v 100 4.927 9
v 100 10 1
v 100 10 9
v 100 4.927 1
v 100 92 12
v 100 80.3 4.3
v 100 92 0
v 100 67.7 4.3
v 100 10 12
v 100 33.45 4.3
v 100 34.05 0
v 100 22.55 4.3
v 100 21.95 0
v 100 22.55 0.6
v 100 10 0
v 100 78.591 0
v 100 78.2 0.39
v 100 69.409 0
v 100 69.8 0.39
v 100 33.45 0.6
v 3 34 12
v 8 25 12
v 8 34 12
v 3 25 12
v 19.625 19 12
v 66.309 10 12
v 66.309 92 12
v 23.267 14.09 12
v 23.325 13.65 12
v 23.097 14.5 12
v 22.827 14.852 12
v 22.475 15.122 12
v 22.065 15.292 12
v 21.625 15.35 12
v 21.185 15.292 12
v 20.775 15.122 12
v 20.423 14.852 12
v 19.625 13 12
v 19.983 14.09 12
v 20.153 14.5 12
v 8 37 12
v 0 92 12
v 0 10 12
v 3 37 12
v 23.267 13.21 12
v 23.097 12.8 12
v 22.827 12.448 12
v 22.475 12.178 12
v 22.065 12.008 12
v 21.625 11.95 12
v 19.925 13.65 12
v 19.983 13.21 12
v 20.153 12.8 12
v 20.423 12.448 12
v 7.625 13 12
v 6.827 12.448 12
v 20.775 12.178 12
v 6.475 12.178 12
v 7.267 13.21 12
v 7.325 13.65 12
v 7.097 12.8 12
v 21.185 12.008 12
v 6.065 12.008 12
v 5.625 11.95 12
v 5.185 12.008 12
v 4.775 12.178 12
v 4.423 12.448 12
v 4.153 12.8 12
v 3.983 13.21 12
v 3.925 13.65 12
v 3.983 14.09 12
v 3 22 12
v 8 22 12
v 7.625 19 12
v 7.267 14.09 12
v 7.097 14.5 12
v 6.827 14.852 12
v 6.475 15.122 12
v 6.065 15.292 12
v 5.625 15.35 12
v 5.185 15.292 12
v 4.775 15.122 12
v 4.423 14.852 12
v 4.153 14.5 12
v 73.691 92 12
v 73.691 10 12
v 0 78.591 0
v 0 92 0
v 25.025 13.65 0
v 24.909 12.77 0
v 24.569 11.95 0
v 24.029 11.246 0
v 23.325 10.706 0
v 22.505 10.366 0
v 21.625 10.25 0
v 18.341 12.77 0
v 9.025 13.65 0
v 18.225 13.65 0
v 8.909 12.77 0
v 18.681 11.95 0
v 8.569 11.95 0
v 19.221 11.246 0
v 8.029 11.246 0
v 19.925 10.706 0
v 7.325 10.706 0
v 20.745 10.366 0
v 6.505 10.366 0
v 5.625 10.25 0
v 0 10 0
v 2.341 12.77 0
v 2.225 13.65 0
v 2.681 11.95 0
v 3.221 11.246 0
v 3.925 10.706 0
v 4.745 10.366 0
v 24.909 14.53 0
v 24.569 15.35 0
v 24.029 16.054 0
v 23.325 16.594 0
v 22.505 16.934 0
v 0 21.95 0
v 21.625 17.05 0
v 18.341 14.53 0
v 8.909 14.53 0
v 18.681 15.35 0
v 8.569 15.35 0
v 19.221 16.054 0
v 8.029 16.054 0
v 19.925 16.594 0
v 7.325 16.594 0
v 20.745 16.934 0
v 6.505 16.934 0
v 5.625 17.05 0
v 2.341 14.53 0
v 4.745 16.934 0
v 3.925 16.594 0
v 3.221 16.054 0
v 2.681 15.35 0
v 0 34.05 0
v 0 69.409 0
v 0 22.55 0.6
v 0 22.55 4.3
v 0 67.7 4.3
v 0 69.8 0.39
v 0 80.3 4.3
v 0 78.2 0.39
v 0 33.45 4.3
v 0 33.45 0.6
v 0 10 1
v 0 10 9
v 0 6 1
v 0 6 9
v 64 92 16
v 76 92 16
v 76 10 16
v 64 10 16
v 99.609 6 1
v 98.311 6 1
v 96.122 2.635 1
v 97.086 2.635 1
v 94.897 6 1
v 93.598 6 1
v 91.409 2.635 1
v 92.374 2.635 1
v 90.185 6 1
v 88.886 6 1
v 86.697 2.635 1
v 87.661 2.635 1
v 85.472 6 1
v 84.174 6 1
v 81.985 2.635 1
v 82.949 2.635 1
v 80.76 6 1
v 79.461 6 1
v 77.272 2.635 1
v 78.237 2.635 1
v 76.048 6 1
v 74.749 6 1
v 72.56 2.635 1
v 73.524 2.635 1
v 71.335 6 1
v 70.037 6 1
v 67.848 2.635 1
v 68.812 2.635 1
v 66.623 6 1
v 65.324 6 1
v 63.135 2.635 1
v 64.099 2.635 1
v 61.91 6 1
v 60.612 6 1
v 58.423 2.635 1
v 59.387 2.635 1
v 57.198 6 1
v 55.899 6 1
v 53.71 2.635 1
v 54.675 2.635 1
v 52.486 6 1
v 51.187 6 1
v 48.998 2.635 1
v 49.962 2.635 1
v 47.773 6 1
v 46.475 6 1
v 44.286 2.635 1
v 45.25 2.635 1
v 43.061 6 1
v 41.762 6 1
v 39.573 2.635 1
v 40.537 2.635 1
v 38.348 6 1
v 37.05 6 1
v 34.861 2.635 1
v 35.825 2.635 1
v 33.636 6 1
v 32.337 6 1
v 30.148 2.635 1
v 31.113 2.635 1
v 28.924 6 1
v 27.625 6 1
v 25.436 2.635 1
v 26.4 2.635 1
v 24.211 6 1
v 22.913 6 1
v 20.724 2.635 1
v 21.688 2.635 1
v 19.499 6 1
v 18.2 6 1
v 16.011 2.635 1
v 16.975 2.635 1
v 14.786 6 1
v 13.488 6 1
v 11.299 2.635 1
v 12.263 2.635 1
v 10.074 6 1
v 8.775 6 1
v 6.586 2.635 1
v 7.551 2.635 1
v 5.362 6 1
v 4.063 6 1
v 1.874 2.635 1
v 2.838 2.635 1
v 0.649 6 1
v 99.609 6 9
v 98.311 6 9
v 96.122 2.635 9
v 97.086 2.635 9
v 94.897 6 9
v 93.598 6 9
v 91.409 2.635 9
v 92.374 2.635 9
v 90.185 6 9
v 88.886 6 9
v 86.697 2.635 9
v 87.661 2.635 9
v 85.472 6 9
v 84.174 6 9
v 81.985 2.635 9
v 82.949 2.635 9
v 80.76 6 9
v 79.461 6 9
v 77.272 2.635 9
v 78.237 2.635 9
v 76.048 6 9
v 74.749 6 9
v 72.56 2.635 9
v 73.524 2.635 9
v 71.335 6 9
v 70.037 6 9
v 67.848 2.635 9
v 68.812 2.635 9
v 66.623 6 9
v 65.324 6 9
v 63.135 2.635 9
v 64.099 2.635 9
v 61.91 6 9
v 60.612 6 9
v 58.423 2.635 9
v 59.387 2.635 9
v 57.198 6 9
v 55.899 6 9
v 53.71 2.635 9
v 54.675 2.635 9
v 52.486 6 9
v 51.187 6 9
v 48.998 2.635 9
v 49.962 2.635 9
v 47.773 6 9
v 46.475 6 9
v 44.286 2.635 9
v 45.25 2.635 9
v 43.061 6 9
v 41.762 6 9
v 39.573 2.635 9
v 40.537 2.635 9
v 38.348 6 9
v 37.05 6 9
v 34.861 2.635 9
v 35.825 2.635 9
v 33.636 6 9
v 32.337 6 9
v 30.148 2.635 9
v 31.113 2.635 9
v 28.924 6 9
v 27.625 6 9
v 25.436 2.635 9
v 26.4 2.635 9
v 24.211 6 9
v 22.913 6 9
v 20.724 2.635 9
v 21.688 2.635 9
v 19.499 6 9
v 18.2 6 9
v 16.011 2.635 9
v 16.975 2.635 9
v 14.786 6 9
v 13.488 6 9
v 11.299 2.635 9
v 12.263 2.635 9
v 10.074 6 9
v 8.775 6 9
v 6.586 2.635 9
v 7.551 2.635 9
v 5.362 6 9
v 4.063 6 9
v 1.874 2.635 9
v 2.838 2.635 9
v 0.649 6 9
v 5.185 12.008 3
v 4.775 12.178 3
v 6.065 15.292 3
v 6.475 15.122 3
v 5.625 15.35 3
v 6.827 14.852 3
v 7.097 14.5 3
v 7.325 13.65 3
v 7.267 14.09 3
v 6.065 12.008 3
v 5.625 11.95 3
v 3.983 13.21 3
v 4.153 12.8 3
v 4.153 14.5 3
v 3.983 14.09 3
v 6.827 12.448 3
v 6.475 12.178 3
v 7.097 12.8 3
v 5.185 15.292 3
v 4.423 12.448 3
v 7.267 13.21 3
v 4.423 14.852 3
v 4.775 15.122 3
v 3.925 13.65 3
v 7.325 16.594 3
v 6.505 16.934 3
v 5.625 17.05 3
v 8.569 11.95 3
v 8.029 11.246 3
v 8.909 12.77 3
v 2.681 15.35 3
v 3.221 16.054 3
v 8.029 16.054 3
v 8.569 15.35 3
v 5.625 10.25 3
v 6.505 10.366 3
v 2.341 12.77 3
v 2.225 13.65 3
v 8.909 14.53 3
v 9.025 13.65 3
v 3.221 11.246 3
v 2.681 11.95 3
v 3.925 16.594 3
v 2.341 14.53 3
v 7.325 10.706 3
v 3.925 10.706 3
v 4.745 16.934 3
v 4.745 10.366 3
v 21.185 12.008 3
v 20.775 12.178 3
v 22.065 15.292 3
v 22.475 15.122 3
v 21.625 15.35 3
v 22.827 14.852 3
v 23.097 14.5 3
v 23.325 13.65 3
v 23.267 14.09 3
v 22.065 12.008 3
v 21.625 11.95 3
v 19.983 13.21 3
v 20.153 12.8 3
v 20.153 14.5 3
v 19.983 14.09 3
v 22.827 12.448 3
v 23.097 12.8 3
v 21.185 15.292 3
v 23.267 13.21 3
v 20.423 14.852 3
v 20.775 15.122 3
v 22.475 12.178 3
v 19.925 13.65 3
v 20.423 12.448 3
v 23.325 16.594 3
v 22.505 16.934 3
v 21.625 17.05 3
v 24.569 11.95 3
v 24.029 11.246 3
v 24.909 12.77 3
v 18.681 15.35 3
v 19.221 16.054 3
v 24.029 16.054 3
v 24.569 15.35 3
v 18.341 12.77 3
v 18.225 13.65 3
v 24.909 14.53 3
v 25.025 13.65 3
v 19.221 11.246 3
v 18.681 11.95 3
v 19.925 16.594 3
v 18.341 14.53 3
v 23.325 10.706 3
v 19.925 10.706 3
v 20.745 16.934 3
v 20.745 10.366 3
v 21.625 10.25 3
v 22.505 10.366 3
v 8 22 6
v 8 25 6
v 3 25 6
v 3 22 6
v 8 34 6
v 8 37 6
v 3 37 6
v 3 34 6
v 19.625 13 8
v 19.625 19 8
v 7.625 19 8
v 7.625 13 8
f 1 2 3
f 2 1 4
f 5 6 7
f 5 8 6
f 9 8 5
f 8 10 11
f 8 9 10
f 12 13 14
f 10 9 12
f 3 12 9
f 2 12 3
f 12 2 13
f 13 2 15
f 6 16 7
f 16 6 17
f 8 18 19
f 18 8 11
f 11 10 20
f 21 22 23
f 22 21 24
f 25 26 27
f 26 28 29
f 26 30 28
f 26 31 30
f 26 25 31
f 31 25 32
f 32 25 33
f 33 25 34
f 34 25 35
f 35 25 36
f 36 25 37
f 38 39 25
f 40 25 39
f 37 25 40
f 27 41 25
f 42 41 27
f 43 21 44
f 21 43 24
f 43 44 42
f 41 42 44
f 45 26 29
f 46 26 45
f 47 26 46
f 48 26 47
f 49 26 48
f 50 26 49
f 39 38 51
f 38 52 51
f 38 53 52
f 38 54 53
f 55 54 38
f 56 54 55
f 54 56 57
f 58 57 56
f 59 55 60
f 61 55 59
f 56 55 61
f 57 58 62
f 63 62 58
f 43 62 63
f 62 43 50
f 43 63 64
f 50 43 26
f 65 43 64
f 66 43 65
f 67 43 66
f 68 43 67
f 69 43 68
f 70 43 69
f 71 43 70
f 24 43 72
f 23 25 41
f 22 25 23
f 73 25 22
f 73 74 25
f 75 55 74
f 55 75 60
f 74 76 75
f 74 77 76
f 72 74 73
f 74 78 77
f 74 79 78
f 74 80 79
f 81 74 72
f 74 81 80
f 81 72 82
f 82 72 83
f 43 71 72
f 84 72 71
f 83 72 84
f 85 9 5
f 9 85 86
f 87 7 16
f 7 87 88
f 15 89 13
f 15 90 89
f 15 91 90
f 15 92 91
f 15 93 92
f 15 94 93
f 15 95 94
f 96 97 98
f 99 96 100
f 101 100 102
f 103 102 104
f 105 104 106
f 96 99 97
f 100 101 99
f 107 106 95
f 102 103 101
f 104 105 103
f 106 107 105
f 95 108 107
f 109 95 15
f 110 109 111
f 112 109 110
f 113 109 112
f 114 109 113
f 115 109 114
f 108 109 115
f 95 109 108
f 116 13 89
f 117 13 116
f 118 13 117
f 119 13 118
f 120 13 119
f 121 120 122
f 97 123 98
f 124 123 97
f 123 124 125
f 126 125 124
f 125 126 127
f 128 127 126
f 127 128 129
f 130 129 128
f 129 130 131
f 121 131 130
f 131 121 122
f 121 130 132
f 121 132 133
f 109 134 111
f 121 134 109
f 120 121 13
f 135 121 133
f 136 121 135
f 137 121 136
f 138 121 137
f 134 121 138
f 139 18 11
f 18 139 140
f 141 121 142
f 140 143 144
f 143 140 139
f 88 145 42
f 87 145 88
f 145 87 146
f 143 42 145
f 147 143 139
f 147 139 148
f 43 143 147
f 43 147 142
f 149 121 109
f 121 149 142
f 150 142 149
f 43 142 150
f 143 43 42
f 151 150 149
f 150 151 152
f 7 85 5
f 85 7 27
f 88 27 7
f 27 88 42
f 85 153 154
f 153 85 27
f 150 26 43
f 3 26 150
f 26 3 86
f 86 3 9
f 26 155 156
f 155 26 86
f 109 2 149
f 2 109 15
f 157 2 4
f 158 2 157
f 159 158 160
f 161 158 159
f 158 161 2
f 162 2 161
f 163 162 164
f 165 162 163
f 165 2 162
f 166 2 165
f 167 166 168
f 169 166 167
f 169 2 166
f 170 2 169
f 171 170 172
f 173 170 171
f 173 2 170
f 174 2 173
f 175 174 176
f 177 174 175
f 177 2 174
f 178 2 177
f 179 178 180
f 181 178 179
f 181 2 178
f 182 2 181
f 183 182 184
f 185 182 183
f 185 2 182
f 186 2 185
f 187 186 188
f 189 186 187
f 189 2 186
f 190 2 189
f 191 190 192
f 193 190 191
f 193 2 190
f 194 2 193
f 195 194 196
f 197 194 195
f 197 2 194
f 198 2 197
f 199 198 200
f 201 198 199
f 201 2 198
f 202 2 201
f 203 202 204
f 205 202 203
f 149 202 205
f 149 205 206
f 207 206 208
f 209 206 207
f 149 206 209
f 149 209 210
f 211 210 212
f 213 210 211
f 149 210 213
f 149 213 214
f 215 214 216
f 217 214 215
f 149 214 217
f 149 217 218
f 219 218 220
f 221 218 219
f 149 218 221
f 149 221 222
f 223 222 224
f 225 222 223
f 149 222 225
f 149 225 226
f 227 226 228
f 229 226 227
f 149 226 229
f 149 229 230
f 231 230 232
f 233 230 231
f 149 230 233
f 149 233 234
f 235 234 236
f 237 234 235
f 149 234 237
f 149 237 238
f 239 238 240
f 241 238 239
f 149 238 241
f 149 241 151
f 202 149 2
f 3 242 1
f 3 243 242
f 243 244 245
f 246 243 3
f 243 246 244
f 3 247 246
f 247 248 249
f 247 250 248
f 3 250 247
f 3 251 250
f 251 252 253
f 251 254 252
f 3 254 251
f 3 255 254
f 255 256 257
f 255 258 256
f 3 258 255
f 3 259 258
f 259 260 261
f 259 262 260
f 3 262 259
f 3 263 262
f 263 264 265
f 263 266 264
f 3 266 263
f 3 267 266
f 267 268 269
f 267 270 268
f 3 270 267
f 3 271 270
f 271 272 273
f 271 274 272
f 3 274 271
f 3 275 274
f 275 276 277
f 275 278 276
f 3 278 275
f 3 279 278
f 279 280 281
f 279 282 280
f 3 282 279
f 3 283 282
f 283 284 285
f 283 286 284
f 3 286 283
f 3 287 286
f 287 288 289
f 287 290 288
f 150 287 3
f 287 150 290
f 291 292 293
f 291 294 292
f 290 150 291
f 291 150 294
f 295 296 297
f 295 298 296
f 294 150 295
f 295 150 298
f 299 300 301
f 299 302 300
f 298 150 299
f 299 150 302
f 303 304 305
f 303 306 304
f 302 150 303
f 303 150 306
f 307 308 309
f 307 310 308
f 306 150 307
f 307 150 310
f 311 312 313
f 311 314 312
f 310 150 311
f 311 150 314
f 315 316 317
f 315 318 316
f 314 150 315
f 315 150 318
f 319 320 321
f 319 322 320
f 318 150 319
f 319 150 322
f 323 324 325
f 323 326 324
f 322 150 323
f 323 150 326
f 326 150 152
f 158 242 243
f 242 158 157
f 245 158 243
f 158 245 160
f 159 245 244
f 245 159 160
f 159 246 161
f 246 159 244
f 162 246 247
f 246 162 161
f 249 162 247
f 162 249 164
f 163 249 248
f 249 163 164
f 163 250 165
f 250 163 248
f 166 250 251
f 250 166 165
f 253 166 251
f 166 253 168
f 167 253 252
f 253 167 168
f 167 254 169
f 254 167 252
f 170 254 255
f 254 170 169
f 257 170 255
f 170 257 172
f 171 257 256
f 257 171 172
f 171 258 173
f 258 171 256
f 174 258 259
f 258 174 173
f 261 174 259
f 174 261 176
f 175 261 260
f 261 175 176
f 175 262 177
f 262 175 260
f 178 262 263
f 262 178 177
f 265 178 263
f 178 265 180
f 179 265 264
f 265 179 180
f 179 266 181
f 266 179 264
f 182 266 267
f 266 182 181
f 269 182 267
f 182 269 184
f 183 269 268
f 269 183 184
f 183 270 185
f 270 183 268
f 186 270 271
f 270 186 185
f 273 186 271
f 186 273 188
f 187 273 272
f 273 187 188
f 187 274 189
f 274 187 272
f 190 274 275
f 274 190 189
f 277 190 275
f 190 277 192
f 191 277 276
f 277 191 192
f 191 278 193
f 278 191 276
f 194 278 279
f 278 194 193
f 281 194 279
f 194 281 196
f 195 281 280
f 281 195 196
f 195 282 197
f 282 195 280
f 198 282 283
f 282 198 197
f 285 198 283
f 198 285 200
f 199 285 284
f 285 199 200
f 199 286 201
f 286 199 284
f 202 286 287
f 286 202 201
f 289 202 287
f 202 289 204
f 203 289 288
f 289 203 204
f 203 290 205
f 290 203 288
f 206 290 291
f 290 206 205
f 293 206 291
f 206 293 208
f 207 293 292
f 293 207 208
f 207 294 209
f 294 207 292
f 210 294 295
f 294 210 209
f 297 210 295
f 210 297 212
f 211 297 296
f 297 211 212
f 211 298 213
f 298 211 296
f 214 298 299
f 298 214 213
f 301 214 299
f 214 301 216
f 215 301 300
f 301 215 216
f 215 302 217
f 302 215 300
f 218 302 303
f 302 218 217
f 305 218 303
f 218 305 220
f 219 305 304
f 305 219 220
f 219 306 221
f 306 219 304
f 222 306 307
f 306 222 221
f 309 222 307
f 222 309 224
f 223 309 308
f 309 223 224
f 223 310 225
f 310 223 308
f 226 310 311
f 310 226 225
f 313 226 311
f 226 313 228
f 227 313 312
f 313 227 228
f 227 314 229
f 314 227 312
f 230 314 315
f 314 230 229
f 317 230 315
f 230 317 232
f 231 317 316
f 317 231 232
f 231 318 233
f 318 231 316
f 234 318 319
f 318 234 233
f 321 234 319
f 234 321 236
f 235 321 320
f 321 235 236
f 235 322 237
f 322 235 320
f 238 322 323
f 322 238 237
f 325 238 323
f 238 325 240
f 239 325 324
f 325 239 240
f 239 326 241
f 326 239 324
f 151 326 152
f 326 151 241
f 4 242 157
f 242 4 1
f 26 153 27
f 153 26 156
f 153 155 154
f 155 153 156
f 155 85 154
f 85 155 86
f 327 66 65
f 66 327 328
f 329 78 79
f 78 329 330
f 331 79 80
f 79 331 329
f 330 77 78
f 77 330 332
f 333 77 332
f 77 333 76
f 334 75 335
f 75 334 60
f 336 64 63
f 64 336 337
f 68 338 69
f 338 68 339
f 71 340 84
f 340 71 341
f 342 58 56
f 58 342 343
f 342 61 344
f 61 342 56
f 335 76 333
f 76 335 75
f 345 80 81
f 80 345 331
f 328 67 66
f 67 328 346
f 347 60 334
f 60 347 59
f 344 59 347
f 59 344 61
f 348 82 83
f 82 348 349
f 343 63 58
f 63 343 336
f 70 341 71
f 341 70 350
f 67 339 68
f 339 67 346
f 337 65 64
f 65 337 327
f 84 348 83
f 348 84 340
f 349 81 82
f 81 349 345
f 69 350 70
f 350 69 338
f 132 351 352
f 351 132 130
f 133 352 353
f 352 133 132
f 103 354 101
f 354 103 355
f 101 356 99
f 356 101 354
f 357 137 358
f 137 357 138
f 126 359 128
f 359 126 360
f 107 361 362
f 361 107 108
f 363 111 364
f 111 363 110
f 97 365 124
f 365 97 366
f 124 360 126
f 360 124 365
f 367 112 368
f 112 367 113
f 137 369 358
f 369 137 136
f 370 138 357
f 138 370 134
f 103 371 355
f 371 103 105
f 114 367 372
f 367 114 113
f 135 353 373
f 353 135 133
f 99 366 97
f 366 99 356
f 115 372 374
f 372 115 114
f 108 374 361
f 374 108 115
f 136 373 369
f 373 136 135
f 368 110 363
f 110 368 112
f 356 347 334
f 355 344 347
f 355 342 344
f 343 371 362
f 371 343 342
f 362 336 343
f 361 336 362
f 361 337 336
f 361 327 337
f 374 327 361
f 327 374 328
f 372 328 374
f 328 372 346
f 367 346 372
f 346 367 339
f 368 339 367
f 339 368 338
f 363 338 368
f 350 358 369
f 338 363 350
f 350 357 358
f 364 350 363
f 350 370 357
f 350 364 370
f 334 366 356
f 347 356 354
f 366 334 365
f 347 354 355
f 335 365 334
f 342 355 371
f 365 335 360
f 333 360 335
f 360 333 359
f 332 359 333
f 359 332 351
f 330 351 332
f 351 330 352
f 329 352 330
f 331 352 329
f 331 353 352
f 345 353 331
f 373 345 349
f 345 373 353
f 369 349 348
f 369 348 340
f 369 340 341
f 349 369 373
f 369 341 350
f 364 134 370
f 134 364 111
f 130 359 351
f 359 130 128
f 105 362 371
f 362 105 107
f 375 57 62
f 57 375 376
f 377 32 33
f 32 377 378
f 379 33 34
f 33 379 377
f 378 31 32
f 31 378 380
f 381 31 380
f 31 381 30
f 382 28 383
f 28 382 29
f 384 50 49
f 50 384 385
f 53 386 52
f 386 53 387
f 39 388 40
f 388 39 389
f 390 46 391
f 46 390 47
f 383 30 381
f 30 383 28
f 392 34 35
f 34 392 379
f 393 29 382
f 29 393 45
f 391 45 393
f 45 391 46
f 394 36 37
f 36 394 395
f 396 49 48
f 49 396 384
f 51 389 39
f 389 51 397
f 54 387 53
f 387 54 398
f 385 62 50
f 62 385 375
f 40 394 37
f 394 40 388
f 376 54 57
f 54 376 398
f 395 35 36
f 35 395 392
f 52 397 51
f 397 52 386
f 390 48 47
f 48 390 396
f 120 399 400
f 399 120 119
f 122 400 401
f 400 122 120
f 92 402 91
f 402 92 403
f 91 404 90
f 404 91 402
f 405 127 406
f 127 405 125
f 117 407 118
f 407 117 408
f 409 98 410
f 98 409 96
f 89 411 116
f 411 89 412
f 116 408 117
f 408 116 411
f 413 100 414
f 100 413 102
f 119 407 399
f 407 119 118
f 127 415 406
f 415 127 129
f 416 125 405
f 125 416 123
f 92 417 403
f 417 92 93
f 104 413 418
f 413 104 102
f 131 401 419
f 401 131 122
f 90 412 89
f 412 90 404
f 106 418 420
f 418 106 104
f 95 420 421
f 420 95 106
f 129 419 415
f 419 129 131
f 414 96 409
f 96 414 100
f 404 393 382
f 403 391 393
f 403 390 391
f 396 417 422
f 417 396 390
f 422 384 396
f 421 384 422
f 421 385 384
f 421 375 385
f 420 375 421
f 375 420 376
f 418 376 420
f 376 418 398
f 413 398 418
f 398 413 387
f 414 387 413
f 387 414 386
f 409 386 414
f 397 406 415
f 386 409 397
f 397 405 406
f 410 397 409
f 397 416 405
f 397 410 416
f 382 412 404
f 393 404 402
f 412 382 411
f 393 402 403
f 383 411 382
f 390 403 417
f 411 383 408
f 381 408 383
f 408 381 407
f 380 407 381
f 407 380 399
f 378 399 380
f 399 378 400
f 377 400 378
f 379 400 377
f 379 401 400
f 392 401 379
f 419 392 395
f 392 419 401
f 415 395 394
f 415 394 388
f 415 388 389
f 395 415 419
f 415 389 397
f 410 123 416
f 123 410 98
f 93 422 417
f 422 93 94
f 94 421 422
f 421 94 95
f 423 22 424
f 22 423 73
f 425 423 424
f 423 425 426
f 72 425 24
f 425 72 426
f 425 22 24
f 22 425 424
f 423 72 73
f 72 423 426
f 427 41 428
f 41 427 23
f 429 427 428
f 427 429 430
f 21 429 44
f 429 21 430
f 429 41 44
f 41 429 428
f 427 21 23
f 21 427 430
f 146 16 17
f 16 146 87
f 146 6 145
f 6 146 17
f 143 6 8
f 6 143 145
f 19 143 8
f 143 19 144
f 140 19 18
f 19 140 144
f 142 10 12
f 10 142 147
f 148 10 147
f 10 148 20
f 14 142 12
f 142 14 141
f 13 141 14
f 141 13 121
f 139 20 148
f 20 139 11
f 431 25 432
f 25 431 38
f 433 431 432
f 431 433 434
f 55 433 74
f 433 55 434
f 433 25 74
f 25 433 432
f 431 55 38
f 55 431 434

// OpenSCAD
// file: ../stage.scad
// ============================================================
//  Positioning stage: base (X dovetail) -> x-slider with column
//  (Z dovetail) -> z-slider (payload face toward +Y) + column cap.
//  Every axis: M3 adjust screw captured in the fixed part by head +
//  nylock, threading into a captive nut in the moving part
//  (0.5 mm/turn, both directions), plus an M3 lock screw.
//  Modules model parts in stage-local coordinates at mid travel.
// ============================================================
include <lib.scad>

// Dovetail standing on the column's +Y face, running along Z.
// multmatrix maps (x,y,z) -> (y,z,x): run->Z, width->X, height->Y.
module zrail_frame() { multmatrix([[0,1,0,0],[0,0,1,0],[1,0,0,0]]) children(); }

module stage_base() {
    rail_x0 = -stage_L / 2;
    rail_len = stage_L - stage_tab_t;
    tab_h = stage_base_h + xs_screw_z + 6;
    difference() {
        union() {
            translate([-stage_L / 2, -stage_D / 2, 0]) cube([stage_L, stage_D, stage_base_h]);
            translate([rail_x0, 0, stage_base_h]) dovetail_rail(rail_len);
            // adjust-screw tab
            translate([stage_L / 2 - stage_tab_t, -8, 0]) cube([stage_tab_t, 16, tab_h]);
        }
        wood_screw_holes(stage_mount_pts, stage_base_h, cbore = 3);
        // X adjust screw through tab (head outside, nylock inside)
        translate([stage_L / 2 - stage_tab_t - 1, 0, stage_base_h + xs_screw_z])
            rotate([0, 90, 0]) screw_hole(m3_d, stage_tab_t + 2);
    }
}

// Upper stack shares the x-slider's X offset.
module stage_x_slider() {
    x0 = xs_xc - xs_len / 2;
    difference() {
        union() {
            translate([x0, -xs_w / 2, stage_base_h]) cube([xs_len, xs_w, xs_h]);
            // column
            translate([xs_xc - col_w / 2, col_y0, xs_top - 0.01]) cube([col_w, col_t, col_h + 0.01]);
            translate([xs_xc, col_y1, xs_top]) zrail_frame() dovetail_rail(col_h);
        }
        translate([x0 - 1, 0, stage_base_h]) dovetail_slot(xs_len + 2);
        // X adjust: screw enters +X face, nut dropped in from the top
        translate([x0 + xs_len + 0.01, 0, stage_base_h + xs_screw_z]) rotate([0, -90, 0])
            screw_hole(m3_d, xs_adj_hole);
        translate([x0 + xs_len - 6 - m3_nut_t / 2, -(m3_nut_af + clr) / 2, stage_base_h + xs_screw_z - 3.5])
            cube([m3_nut_t + 0.4, m3_nut_af + clr, xs_h]);
        // X lock: horizontal from +Y face onto rail flank, nut from top
        translate([xs_xc + 8, xs_w / 2 + 0.01, stage_base_h + 2.5]) rotate([90, 0, 0])
            screw_hole(m3_d, xs_w / 2 - 3);
        translate([xs_xc + 8 - (m3_nut_af + clr) / 2, 9 - (m3_nut_t + 0.4) / 2, stage_base_h + 2.5 - 3.3])
            cube([m3_nut_af + clr, m3_nut_t + 0.4, xs_h]);
        // cap screws (tapped into column top)
        for (sx = [-8, 8]) translate([xs_xc + sx, col_y0 + 5, col_top - 10])
            screw_hole(m3_tap, 10.1);
    }
}

module stage_z_slider() {
    y0 = col_y1;
    x0 = xs_xc - zs_w / 2;
    difference() {
        translate([x0, y0, zs_z0]) cube([zs_w, zs_t, zs_h]);
        translate([xs_xc, col_y1, zs_z0 - 1]) zrail_frame() dovetail_slot(zs_h + 2);
        // payload holes + nut slots from the bottom
        for (p = payload_pts) {
            translate([xs_xc + p[0], payload_face_y + 0.01, stage_payload_z + p[1]])
                rotate([90, 0, 0]) screw_hole(m3_d, 7.5);
            translate([xs_xc + p[0] - (m3_nut_af + clr) / 2, payload_face_y - 4 - (m3_nut_t + 0.4) / 2, zs_z0 - 1])
                cube([m3_nut_af + clr, m3_nut_t + 0.4, zs_h / 2 + 1 + 3.3]);
        }
        // Z adjust: through hole, nut slot from the -X side 5 below the top
        translate([xs_xc + zs_screw_x, zs_screw_y, zs_z0 + zs_h - zs_adj_hole]) screw_hole(m3_d, zs_adj_hole + 0.1);
        translate([x0 - 1, zs_screw_y - (m3_nut_af + clr) / 2, zs_z0 + zs_h - 5 - (m3_nut_t + 0.4) / 2])
            cube([zs_screw_x + zs_w / 2 + 1 + (m3_nut_af + clr) / 2, m3_nut_af + clr, m3_nut_t + 0.4]);
        // Z lock: from the +X (outward) side onto the rail flank, nut dropped in from the top
        lz = zs_z0 + zs_h - 5;
        x1 = x0 + zs_w;
        translate([x1 + 0.01, col_y1 + 2, lz]) rotate([0, -90, 0]) screw_hole(m3_d, zs_w / 2 - 4);
        translate([x1 - 2.5 - (m3_nut_t + 0.4), col_y1 + 2 - zl_pocket_w / 2, lz - (m3_nut_af + clr) / 2 / cos(30)])
            cube([m3_nut_t + 0.4, zl_pocket_w, zs_h]);
    }
}

module stage_z_cap() {
    difference() {
        // stops 1 mm short of the payload face so the payload never rubs it
        translate([xs_xc - col_w / 2, col_y0, col_top]) cube([col_w, payload_face_y - col_y0 - 1, cap_t]);
        for (sx = [-8, 8]) translate([xs_xc + sx, col_y0 + 5, col_top]) screw_hole(m3_d, cap_t);
        translate([xs_xc + zs_screw_x, zs_screw_y, col_top]) screw_hole(m3_d, cap_t);
    }
}

// ---- placed at a fine-travel offset (dx, dz) ----
module stage_x_slider_placed(dx = 0) { translate([dx, 0, 0]) stage_x_slider(); }
module stage_z_cap_placed(dx = 0)    { translate([dx, 0, 0]) stage_z_cap(); }
module stage_z_slider_placed(dx = 0, dz = 0) { translate([dx, 0, dz]) stage_z_slider(); }

// Children placed at the payload face centre (origin on the face, +Y out).
module stage_payload_origin(dx = 0, dz = 0) {
    translate([xs_xc + dx, payload_face_y, stage_payload_z + dz]) children();
}

// Optional mirror (tower B) wraps the stage-local geometry.
module stage_hand(mir) { if (mir) mirror([1, 0, 0]) children(); else children(); }

module stage_assembly(dx = 0, dz = 0) {
    color("SteelBlue") stage_base();
    color("LightSteelBlue") stage_x_slider_placed(dx);
    color("SkyBlue") stage_z_cap_placed(dx);
    color("CadetBlue") stage_z_slider_placed(dx, dz);
}

// ---- travel checks ----
_right_gap = (stage_L / 2 - stage_tab_t) - (xs_xc + xs_len / 2) - locknut_t;
_left_ok   = 10;   // slider may overhang the rail start by up to 10 mm
echo("CHECK", "stage_travel_x", 2 * min(_right_gap, _left_ok));
// adjust screws: head on the fixed tab/cap, tip must pass the moving nut
// at the far travel end and stay inside the hole at the near end
_xnut = xs_xc + xs_len / 2 - 6;                  // nut centre X at mid
_xtip = stage_L / 2 - x_adj_len;
echo("CHECK", "x_adj_engage", (_xnut - stage_travel - (m3_nut_t + 0.4) / 2) - _xtip);
echo("CHECK", "x_adj_hole", _xtip - (xs_xc + xs_len / 2 + stage_travel - xs_adj_hole));
_znut = zs_z0 + zs_h - 5;
_ztip = stage_top_z - z_adj_len;
echo("CHECK", "z_adj_engage", (_znut - stage_travel - (m3_nut_t + 0.4) / 2) - _ztip);
echo("CHECK", "z_adj_hole", _ztip - (zs_z0 + zs_h + stage_travel - zs_adj_hole));
echo("CHECK", "z_lock_pocket_w", zl_pocket_w);
echo("CHECK", "stage_travel_z", 2 * min(stage_gap_z, cap_gap - locknut_t));
// file: ../axes.scad
// ============================================================
//  Plug carriage: X base (fixed, X servo) -> X carriage (rack on
//  its -Y face, Y servo) -> Y carriage (rack on its -X face, male
//  stage pad, cable pillar).
//  World coords; carriage modules take x_pos (plug X) / y_pos.
// ============================================================
include <stage.scad>

runner_w = 10;     // plain (non-dovetail) rear X runner
runner_h = dt_h;

// ---------------- X base ----------------
xb_x0 = x_rail_x0 - 6;
xb_x1 = x_rail_x0 + x_rail_len + 6;
xb_y0 = x_shaft_y - servo_body[0] + servo_shaft_off - 12;
xb_y1 = xc_y1;
xb_screws = [[xb_x0 + 7, xb_y0 + 7], [xb_x1 - 7, xb_y0 + 7],
             [xb_x0 + 7, xb_y1 - 7], [xb_x1 - 7, xb_y1 - 7],
             [(xb_x0 + xb_x1) / 2, xb_y1 - 7]];

module x_servo_holder_world() {
    at_inverted_servo(x_shaft_x, x_shaft_y, x_pinion_z0, 90) mg995_holder();
}
// Holder floor-screw holes, mapped from the holder frame to the floor.
module x_holder_floor_holes() {
    at_inverted_servo(x_shaft_x, x_shaft_y, x_pinion_z0, 90) translate([0, 0, holder_floor_up])
        mirror([0, 0, 1]) translate([0, 0, -xb_t]) holder_floor_holes(xb_t);
}
module x_servo_world() {
    at_inverted_servo(x_shaft_x, x_shaft_y, x_pinion_z0, 90) mg995_model();
    x_servo_holder_world();
}
module x_pinion_world() {
    translate([x_shaft_x, x_shaft_y, x_pinion_z0]) color("Gold") pinion();
}

module x_base() {
    difference() {
        union() {
            translate([xb_x0, xb_y0, 0]) cube([xb_x1 - xb_x0, xb_y1 - xb_y0, xb_t]);
            translate([x_rail_x0, x_rail_y[1], xb_t]) dovetail_rail(x_rail_len);
            translate([x_rail_x0, x_rail_y[0] - runner_w / 2, xb_t - 0.01])
                cube([x_rail_len, runner_w, runner_h + 0.01]);
        }
        wood_screw_holes(xb_screws, xb_t, cbore = 2);
        x_holder_floor_holes();
        // pinion clearance pocket (keeps the plate clear of the gear)
        translate([x_shaft_x, x_shaft_y, xb_t - 1]) cylinder(r = pinion_pd / 2 + gear_mod + 1, h = 2);
        // servo-lead exit notch at the rear edge, plus zip-tie slots
        translate([x_shaft_x - 6, xb_y0 - 1, -1]) cube([12, 8, xb_t + 2]);
        for (dx = [-10, 10]) translate([x_shaft_x + dx - 1.5, xb_y0 + 12, -1]) cube([3, 5, xb_t + 2]);
    }
}

// ---------------- X carriage (modelled at x_pos = 0) ----------------
module y_servo_holder_local() {
    at_inverted_servo(y_shaft_x_rel, y_shaft_y, y_pinion_z0, 90) mg995_holder();
}
module y_holder_floor_holes() {
    at_inverted_servo(y_shaft_x_rel, y_shaft_y, y_pinion_z0, 90) translate([0, 0, holder_floor_up])
        mirror([0, 0, 1]) translate([0, 0, -xc_h]) holder_floor_holes(xc_h);
}
module y_servo_local() {
    at_inverted_servo(y_shaft_x_rel, y_shaft_y, y_pinion_z0, 90) mg995_model();
}

module x_carriage() {
    difference() {
        union() {
            translate([xc_x0, xc_y0, xc_z0]) cube([xc_len, xc_y1 - xc_y0, xc_h]);
            // X rack on the -Y face, teeth toward -Y
            translate([xc_x0, xc_y0 + 0.01, x_rack_z0]) mirror([0, 1, 0]) rack(xc_len, base_h = rack_base);
            // Y rail on top, under the Y carriage
            translate([-xs_xc, xc_y0, xc_top]) rotate([0, 0, 90]) dovetail_rail(xc_y1 - xc_y0);
        }
        y_holder_floor_holes();
        translate([xc_x0 - 1, x_rail_y[1], xc_z0]) dovetail_slot(xc_len + 2);
        translate([xc_x0 - 1, x_rail_y[0] - runner_w / 2 - clr - 0.15, xc_z0 - 1])
            cube([xc_len + 2, runner_w + 2 * clr + 0.3, runner_h + clr + 1]);
        translate([xc_x0 - 1, x_rail_y[0], xc_z0]) rotate([90, 0, 90]) linear_extrude(xc_len + 2)
            chamfer_mouth(runner_w + 2 * clr + 0.3);
        // lightening / Y-servo lead pass-through + zip-tie slots
        translate([y_shaft_x_rel - 6, xc_y0 + 3, xc_top - 4]) cube([12, 6, 5]);
        for (dy = [12, 24]) translate([xc_x0 + 3, xc_y0 + dy, xc_z0 + runner_h + 2]) cube([5, 3, xc_h]);
    }
}
module x_carriage_world(x_pos) { translate([x_pos, 0, 0]) x_carriage(); }
module y_servo_world(x_pos) { translate([x_pos, 0, 0]) { y_servo_local(); y_servo_holder_local(); } }
module y_pinion_world(x_pos) {
    translate([x_pos + y_shaft_x_rel, y_shaft_y, y_pinion_z0]) color("Gold") pinion();
}

echo("CHECK", "x_rail_len", x_rail_len);
// X base front edge to the port towers' base front edge (Y)
echo("CHECK", "xbase_tower_gap", (tower_y - stage_D / 2) - xb_y1);
echo("CHECK", "x_mesh_gap", (x_pitch_y - x_shaft_y) - pinion_pd / 2);
echo("CHECK", "x_travel_needed", x_pos_max - x_pos_min);

// ---------------- Y carriage (coords relative to male stage origin
//                  in X/Y, world Z) ----------------
pillar_w   = 16;
// top of the flexure frame (mirrors plug_mount.scad) + 6 so the cable clears it
pillar_top = port_z + plug_drop - 1 + flex_isl_h + 6 + 5 + 6;

module y_carriage() {
    difference() {
        union() {
            translate([yc_x0, yc_y0, yc_z0]) cube([yc_x1 - yc_x0, yc_len, yc_h]);
            // Y rack on the -X face, teeth toward -X
            translate([yc_x0 + 0.01, yc_y0, y_rack_z0]) rotate([0, 0, 90]) rack(yc_len, base_h = rack_base);
            // cable strain-relief pillar at the rear, in line with the plug
            translate([xs_xc - pillar_w / 2, yc_y0, yc_z0]) cube([pillar_w, yc_pillar_d, pillar_top - yc_z0]);
        }
        translate([0, yc_y0 - 1, yc_z0]) rotate([0, 0, 90]) dovetail_slot(yc_len + 2);
        // M4 bolts up through captive nuts into the stage base
        for (p = stage_mount_pts) translate([p[0], p[1], yc_z0]) {
            screw_hole(m4_d, yc_h);
            translate([0, 0, -0.01]) m4_nut_trap(m4_nut_t + 0.5);
        }
        // two zip-tie slots through the pillar, near its front face
        for (dz = [6, 18]) translate([xs_xc - pillar_w / 2 - 1, yc_y0 + yc_pillar_d - 5.5, pillar_top - dz])
            cube([pillar_w + 2, 3, 5]);
    }
}
module y_carriage_world(x_pos, y_pos) {
    o = ms_origin(x_pos, y_pos);
    translate([o[0], o[1], 0]) y_carriage();
}

echo("CHECK", "m4_stage_bolt_protrude", m4_stage_bolt_len - ((stage_base_h - 3) + yc_h));
echo("CHECK", "y_mesh_gap", ((y_pitch_x_rel - xs_xc) - y_shaft_x_rel) - pinion_pd / 2);
echo("CHECK", "pillar_top_z", pillar_top);
echo("CHECK", "pillar_min", port_z + 25);
// rack length left past the pinion centre at the worst travel end
echo("CHECK", "x_rack_engage_min",
     min(x_shaft_x - (x_pos_max + xc_x0), (x_pos_min + xc_x1) - x_shaft_x));
echo("CHECK", "y_rack_engage_min",
     min(y_shaft_y - (ms_origin(0, y_travel)[1] + yc_y0), (ms_origin(0, 0)[1] + yc_y1) - y_shaft_y));
// main file
// X carriage: X rack, Y rail, inverted Y servo holder. Qty 1.
// Print as shown (slots down; they bridge).
include <../axes.scad>
translate([-xc_x0, -xc_y0 + 10, -xc_z0]) x_carriage();
